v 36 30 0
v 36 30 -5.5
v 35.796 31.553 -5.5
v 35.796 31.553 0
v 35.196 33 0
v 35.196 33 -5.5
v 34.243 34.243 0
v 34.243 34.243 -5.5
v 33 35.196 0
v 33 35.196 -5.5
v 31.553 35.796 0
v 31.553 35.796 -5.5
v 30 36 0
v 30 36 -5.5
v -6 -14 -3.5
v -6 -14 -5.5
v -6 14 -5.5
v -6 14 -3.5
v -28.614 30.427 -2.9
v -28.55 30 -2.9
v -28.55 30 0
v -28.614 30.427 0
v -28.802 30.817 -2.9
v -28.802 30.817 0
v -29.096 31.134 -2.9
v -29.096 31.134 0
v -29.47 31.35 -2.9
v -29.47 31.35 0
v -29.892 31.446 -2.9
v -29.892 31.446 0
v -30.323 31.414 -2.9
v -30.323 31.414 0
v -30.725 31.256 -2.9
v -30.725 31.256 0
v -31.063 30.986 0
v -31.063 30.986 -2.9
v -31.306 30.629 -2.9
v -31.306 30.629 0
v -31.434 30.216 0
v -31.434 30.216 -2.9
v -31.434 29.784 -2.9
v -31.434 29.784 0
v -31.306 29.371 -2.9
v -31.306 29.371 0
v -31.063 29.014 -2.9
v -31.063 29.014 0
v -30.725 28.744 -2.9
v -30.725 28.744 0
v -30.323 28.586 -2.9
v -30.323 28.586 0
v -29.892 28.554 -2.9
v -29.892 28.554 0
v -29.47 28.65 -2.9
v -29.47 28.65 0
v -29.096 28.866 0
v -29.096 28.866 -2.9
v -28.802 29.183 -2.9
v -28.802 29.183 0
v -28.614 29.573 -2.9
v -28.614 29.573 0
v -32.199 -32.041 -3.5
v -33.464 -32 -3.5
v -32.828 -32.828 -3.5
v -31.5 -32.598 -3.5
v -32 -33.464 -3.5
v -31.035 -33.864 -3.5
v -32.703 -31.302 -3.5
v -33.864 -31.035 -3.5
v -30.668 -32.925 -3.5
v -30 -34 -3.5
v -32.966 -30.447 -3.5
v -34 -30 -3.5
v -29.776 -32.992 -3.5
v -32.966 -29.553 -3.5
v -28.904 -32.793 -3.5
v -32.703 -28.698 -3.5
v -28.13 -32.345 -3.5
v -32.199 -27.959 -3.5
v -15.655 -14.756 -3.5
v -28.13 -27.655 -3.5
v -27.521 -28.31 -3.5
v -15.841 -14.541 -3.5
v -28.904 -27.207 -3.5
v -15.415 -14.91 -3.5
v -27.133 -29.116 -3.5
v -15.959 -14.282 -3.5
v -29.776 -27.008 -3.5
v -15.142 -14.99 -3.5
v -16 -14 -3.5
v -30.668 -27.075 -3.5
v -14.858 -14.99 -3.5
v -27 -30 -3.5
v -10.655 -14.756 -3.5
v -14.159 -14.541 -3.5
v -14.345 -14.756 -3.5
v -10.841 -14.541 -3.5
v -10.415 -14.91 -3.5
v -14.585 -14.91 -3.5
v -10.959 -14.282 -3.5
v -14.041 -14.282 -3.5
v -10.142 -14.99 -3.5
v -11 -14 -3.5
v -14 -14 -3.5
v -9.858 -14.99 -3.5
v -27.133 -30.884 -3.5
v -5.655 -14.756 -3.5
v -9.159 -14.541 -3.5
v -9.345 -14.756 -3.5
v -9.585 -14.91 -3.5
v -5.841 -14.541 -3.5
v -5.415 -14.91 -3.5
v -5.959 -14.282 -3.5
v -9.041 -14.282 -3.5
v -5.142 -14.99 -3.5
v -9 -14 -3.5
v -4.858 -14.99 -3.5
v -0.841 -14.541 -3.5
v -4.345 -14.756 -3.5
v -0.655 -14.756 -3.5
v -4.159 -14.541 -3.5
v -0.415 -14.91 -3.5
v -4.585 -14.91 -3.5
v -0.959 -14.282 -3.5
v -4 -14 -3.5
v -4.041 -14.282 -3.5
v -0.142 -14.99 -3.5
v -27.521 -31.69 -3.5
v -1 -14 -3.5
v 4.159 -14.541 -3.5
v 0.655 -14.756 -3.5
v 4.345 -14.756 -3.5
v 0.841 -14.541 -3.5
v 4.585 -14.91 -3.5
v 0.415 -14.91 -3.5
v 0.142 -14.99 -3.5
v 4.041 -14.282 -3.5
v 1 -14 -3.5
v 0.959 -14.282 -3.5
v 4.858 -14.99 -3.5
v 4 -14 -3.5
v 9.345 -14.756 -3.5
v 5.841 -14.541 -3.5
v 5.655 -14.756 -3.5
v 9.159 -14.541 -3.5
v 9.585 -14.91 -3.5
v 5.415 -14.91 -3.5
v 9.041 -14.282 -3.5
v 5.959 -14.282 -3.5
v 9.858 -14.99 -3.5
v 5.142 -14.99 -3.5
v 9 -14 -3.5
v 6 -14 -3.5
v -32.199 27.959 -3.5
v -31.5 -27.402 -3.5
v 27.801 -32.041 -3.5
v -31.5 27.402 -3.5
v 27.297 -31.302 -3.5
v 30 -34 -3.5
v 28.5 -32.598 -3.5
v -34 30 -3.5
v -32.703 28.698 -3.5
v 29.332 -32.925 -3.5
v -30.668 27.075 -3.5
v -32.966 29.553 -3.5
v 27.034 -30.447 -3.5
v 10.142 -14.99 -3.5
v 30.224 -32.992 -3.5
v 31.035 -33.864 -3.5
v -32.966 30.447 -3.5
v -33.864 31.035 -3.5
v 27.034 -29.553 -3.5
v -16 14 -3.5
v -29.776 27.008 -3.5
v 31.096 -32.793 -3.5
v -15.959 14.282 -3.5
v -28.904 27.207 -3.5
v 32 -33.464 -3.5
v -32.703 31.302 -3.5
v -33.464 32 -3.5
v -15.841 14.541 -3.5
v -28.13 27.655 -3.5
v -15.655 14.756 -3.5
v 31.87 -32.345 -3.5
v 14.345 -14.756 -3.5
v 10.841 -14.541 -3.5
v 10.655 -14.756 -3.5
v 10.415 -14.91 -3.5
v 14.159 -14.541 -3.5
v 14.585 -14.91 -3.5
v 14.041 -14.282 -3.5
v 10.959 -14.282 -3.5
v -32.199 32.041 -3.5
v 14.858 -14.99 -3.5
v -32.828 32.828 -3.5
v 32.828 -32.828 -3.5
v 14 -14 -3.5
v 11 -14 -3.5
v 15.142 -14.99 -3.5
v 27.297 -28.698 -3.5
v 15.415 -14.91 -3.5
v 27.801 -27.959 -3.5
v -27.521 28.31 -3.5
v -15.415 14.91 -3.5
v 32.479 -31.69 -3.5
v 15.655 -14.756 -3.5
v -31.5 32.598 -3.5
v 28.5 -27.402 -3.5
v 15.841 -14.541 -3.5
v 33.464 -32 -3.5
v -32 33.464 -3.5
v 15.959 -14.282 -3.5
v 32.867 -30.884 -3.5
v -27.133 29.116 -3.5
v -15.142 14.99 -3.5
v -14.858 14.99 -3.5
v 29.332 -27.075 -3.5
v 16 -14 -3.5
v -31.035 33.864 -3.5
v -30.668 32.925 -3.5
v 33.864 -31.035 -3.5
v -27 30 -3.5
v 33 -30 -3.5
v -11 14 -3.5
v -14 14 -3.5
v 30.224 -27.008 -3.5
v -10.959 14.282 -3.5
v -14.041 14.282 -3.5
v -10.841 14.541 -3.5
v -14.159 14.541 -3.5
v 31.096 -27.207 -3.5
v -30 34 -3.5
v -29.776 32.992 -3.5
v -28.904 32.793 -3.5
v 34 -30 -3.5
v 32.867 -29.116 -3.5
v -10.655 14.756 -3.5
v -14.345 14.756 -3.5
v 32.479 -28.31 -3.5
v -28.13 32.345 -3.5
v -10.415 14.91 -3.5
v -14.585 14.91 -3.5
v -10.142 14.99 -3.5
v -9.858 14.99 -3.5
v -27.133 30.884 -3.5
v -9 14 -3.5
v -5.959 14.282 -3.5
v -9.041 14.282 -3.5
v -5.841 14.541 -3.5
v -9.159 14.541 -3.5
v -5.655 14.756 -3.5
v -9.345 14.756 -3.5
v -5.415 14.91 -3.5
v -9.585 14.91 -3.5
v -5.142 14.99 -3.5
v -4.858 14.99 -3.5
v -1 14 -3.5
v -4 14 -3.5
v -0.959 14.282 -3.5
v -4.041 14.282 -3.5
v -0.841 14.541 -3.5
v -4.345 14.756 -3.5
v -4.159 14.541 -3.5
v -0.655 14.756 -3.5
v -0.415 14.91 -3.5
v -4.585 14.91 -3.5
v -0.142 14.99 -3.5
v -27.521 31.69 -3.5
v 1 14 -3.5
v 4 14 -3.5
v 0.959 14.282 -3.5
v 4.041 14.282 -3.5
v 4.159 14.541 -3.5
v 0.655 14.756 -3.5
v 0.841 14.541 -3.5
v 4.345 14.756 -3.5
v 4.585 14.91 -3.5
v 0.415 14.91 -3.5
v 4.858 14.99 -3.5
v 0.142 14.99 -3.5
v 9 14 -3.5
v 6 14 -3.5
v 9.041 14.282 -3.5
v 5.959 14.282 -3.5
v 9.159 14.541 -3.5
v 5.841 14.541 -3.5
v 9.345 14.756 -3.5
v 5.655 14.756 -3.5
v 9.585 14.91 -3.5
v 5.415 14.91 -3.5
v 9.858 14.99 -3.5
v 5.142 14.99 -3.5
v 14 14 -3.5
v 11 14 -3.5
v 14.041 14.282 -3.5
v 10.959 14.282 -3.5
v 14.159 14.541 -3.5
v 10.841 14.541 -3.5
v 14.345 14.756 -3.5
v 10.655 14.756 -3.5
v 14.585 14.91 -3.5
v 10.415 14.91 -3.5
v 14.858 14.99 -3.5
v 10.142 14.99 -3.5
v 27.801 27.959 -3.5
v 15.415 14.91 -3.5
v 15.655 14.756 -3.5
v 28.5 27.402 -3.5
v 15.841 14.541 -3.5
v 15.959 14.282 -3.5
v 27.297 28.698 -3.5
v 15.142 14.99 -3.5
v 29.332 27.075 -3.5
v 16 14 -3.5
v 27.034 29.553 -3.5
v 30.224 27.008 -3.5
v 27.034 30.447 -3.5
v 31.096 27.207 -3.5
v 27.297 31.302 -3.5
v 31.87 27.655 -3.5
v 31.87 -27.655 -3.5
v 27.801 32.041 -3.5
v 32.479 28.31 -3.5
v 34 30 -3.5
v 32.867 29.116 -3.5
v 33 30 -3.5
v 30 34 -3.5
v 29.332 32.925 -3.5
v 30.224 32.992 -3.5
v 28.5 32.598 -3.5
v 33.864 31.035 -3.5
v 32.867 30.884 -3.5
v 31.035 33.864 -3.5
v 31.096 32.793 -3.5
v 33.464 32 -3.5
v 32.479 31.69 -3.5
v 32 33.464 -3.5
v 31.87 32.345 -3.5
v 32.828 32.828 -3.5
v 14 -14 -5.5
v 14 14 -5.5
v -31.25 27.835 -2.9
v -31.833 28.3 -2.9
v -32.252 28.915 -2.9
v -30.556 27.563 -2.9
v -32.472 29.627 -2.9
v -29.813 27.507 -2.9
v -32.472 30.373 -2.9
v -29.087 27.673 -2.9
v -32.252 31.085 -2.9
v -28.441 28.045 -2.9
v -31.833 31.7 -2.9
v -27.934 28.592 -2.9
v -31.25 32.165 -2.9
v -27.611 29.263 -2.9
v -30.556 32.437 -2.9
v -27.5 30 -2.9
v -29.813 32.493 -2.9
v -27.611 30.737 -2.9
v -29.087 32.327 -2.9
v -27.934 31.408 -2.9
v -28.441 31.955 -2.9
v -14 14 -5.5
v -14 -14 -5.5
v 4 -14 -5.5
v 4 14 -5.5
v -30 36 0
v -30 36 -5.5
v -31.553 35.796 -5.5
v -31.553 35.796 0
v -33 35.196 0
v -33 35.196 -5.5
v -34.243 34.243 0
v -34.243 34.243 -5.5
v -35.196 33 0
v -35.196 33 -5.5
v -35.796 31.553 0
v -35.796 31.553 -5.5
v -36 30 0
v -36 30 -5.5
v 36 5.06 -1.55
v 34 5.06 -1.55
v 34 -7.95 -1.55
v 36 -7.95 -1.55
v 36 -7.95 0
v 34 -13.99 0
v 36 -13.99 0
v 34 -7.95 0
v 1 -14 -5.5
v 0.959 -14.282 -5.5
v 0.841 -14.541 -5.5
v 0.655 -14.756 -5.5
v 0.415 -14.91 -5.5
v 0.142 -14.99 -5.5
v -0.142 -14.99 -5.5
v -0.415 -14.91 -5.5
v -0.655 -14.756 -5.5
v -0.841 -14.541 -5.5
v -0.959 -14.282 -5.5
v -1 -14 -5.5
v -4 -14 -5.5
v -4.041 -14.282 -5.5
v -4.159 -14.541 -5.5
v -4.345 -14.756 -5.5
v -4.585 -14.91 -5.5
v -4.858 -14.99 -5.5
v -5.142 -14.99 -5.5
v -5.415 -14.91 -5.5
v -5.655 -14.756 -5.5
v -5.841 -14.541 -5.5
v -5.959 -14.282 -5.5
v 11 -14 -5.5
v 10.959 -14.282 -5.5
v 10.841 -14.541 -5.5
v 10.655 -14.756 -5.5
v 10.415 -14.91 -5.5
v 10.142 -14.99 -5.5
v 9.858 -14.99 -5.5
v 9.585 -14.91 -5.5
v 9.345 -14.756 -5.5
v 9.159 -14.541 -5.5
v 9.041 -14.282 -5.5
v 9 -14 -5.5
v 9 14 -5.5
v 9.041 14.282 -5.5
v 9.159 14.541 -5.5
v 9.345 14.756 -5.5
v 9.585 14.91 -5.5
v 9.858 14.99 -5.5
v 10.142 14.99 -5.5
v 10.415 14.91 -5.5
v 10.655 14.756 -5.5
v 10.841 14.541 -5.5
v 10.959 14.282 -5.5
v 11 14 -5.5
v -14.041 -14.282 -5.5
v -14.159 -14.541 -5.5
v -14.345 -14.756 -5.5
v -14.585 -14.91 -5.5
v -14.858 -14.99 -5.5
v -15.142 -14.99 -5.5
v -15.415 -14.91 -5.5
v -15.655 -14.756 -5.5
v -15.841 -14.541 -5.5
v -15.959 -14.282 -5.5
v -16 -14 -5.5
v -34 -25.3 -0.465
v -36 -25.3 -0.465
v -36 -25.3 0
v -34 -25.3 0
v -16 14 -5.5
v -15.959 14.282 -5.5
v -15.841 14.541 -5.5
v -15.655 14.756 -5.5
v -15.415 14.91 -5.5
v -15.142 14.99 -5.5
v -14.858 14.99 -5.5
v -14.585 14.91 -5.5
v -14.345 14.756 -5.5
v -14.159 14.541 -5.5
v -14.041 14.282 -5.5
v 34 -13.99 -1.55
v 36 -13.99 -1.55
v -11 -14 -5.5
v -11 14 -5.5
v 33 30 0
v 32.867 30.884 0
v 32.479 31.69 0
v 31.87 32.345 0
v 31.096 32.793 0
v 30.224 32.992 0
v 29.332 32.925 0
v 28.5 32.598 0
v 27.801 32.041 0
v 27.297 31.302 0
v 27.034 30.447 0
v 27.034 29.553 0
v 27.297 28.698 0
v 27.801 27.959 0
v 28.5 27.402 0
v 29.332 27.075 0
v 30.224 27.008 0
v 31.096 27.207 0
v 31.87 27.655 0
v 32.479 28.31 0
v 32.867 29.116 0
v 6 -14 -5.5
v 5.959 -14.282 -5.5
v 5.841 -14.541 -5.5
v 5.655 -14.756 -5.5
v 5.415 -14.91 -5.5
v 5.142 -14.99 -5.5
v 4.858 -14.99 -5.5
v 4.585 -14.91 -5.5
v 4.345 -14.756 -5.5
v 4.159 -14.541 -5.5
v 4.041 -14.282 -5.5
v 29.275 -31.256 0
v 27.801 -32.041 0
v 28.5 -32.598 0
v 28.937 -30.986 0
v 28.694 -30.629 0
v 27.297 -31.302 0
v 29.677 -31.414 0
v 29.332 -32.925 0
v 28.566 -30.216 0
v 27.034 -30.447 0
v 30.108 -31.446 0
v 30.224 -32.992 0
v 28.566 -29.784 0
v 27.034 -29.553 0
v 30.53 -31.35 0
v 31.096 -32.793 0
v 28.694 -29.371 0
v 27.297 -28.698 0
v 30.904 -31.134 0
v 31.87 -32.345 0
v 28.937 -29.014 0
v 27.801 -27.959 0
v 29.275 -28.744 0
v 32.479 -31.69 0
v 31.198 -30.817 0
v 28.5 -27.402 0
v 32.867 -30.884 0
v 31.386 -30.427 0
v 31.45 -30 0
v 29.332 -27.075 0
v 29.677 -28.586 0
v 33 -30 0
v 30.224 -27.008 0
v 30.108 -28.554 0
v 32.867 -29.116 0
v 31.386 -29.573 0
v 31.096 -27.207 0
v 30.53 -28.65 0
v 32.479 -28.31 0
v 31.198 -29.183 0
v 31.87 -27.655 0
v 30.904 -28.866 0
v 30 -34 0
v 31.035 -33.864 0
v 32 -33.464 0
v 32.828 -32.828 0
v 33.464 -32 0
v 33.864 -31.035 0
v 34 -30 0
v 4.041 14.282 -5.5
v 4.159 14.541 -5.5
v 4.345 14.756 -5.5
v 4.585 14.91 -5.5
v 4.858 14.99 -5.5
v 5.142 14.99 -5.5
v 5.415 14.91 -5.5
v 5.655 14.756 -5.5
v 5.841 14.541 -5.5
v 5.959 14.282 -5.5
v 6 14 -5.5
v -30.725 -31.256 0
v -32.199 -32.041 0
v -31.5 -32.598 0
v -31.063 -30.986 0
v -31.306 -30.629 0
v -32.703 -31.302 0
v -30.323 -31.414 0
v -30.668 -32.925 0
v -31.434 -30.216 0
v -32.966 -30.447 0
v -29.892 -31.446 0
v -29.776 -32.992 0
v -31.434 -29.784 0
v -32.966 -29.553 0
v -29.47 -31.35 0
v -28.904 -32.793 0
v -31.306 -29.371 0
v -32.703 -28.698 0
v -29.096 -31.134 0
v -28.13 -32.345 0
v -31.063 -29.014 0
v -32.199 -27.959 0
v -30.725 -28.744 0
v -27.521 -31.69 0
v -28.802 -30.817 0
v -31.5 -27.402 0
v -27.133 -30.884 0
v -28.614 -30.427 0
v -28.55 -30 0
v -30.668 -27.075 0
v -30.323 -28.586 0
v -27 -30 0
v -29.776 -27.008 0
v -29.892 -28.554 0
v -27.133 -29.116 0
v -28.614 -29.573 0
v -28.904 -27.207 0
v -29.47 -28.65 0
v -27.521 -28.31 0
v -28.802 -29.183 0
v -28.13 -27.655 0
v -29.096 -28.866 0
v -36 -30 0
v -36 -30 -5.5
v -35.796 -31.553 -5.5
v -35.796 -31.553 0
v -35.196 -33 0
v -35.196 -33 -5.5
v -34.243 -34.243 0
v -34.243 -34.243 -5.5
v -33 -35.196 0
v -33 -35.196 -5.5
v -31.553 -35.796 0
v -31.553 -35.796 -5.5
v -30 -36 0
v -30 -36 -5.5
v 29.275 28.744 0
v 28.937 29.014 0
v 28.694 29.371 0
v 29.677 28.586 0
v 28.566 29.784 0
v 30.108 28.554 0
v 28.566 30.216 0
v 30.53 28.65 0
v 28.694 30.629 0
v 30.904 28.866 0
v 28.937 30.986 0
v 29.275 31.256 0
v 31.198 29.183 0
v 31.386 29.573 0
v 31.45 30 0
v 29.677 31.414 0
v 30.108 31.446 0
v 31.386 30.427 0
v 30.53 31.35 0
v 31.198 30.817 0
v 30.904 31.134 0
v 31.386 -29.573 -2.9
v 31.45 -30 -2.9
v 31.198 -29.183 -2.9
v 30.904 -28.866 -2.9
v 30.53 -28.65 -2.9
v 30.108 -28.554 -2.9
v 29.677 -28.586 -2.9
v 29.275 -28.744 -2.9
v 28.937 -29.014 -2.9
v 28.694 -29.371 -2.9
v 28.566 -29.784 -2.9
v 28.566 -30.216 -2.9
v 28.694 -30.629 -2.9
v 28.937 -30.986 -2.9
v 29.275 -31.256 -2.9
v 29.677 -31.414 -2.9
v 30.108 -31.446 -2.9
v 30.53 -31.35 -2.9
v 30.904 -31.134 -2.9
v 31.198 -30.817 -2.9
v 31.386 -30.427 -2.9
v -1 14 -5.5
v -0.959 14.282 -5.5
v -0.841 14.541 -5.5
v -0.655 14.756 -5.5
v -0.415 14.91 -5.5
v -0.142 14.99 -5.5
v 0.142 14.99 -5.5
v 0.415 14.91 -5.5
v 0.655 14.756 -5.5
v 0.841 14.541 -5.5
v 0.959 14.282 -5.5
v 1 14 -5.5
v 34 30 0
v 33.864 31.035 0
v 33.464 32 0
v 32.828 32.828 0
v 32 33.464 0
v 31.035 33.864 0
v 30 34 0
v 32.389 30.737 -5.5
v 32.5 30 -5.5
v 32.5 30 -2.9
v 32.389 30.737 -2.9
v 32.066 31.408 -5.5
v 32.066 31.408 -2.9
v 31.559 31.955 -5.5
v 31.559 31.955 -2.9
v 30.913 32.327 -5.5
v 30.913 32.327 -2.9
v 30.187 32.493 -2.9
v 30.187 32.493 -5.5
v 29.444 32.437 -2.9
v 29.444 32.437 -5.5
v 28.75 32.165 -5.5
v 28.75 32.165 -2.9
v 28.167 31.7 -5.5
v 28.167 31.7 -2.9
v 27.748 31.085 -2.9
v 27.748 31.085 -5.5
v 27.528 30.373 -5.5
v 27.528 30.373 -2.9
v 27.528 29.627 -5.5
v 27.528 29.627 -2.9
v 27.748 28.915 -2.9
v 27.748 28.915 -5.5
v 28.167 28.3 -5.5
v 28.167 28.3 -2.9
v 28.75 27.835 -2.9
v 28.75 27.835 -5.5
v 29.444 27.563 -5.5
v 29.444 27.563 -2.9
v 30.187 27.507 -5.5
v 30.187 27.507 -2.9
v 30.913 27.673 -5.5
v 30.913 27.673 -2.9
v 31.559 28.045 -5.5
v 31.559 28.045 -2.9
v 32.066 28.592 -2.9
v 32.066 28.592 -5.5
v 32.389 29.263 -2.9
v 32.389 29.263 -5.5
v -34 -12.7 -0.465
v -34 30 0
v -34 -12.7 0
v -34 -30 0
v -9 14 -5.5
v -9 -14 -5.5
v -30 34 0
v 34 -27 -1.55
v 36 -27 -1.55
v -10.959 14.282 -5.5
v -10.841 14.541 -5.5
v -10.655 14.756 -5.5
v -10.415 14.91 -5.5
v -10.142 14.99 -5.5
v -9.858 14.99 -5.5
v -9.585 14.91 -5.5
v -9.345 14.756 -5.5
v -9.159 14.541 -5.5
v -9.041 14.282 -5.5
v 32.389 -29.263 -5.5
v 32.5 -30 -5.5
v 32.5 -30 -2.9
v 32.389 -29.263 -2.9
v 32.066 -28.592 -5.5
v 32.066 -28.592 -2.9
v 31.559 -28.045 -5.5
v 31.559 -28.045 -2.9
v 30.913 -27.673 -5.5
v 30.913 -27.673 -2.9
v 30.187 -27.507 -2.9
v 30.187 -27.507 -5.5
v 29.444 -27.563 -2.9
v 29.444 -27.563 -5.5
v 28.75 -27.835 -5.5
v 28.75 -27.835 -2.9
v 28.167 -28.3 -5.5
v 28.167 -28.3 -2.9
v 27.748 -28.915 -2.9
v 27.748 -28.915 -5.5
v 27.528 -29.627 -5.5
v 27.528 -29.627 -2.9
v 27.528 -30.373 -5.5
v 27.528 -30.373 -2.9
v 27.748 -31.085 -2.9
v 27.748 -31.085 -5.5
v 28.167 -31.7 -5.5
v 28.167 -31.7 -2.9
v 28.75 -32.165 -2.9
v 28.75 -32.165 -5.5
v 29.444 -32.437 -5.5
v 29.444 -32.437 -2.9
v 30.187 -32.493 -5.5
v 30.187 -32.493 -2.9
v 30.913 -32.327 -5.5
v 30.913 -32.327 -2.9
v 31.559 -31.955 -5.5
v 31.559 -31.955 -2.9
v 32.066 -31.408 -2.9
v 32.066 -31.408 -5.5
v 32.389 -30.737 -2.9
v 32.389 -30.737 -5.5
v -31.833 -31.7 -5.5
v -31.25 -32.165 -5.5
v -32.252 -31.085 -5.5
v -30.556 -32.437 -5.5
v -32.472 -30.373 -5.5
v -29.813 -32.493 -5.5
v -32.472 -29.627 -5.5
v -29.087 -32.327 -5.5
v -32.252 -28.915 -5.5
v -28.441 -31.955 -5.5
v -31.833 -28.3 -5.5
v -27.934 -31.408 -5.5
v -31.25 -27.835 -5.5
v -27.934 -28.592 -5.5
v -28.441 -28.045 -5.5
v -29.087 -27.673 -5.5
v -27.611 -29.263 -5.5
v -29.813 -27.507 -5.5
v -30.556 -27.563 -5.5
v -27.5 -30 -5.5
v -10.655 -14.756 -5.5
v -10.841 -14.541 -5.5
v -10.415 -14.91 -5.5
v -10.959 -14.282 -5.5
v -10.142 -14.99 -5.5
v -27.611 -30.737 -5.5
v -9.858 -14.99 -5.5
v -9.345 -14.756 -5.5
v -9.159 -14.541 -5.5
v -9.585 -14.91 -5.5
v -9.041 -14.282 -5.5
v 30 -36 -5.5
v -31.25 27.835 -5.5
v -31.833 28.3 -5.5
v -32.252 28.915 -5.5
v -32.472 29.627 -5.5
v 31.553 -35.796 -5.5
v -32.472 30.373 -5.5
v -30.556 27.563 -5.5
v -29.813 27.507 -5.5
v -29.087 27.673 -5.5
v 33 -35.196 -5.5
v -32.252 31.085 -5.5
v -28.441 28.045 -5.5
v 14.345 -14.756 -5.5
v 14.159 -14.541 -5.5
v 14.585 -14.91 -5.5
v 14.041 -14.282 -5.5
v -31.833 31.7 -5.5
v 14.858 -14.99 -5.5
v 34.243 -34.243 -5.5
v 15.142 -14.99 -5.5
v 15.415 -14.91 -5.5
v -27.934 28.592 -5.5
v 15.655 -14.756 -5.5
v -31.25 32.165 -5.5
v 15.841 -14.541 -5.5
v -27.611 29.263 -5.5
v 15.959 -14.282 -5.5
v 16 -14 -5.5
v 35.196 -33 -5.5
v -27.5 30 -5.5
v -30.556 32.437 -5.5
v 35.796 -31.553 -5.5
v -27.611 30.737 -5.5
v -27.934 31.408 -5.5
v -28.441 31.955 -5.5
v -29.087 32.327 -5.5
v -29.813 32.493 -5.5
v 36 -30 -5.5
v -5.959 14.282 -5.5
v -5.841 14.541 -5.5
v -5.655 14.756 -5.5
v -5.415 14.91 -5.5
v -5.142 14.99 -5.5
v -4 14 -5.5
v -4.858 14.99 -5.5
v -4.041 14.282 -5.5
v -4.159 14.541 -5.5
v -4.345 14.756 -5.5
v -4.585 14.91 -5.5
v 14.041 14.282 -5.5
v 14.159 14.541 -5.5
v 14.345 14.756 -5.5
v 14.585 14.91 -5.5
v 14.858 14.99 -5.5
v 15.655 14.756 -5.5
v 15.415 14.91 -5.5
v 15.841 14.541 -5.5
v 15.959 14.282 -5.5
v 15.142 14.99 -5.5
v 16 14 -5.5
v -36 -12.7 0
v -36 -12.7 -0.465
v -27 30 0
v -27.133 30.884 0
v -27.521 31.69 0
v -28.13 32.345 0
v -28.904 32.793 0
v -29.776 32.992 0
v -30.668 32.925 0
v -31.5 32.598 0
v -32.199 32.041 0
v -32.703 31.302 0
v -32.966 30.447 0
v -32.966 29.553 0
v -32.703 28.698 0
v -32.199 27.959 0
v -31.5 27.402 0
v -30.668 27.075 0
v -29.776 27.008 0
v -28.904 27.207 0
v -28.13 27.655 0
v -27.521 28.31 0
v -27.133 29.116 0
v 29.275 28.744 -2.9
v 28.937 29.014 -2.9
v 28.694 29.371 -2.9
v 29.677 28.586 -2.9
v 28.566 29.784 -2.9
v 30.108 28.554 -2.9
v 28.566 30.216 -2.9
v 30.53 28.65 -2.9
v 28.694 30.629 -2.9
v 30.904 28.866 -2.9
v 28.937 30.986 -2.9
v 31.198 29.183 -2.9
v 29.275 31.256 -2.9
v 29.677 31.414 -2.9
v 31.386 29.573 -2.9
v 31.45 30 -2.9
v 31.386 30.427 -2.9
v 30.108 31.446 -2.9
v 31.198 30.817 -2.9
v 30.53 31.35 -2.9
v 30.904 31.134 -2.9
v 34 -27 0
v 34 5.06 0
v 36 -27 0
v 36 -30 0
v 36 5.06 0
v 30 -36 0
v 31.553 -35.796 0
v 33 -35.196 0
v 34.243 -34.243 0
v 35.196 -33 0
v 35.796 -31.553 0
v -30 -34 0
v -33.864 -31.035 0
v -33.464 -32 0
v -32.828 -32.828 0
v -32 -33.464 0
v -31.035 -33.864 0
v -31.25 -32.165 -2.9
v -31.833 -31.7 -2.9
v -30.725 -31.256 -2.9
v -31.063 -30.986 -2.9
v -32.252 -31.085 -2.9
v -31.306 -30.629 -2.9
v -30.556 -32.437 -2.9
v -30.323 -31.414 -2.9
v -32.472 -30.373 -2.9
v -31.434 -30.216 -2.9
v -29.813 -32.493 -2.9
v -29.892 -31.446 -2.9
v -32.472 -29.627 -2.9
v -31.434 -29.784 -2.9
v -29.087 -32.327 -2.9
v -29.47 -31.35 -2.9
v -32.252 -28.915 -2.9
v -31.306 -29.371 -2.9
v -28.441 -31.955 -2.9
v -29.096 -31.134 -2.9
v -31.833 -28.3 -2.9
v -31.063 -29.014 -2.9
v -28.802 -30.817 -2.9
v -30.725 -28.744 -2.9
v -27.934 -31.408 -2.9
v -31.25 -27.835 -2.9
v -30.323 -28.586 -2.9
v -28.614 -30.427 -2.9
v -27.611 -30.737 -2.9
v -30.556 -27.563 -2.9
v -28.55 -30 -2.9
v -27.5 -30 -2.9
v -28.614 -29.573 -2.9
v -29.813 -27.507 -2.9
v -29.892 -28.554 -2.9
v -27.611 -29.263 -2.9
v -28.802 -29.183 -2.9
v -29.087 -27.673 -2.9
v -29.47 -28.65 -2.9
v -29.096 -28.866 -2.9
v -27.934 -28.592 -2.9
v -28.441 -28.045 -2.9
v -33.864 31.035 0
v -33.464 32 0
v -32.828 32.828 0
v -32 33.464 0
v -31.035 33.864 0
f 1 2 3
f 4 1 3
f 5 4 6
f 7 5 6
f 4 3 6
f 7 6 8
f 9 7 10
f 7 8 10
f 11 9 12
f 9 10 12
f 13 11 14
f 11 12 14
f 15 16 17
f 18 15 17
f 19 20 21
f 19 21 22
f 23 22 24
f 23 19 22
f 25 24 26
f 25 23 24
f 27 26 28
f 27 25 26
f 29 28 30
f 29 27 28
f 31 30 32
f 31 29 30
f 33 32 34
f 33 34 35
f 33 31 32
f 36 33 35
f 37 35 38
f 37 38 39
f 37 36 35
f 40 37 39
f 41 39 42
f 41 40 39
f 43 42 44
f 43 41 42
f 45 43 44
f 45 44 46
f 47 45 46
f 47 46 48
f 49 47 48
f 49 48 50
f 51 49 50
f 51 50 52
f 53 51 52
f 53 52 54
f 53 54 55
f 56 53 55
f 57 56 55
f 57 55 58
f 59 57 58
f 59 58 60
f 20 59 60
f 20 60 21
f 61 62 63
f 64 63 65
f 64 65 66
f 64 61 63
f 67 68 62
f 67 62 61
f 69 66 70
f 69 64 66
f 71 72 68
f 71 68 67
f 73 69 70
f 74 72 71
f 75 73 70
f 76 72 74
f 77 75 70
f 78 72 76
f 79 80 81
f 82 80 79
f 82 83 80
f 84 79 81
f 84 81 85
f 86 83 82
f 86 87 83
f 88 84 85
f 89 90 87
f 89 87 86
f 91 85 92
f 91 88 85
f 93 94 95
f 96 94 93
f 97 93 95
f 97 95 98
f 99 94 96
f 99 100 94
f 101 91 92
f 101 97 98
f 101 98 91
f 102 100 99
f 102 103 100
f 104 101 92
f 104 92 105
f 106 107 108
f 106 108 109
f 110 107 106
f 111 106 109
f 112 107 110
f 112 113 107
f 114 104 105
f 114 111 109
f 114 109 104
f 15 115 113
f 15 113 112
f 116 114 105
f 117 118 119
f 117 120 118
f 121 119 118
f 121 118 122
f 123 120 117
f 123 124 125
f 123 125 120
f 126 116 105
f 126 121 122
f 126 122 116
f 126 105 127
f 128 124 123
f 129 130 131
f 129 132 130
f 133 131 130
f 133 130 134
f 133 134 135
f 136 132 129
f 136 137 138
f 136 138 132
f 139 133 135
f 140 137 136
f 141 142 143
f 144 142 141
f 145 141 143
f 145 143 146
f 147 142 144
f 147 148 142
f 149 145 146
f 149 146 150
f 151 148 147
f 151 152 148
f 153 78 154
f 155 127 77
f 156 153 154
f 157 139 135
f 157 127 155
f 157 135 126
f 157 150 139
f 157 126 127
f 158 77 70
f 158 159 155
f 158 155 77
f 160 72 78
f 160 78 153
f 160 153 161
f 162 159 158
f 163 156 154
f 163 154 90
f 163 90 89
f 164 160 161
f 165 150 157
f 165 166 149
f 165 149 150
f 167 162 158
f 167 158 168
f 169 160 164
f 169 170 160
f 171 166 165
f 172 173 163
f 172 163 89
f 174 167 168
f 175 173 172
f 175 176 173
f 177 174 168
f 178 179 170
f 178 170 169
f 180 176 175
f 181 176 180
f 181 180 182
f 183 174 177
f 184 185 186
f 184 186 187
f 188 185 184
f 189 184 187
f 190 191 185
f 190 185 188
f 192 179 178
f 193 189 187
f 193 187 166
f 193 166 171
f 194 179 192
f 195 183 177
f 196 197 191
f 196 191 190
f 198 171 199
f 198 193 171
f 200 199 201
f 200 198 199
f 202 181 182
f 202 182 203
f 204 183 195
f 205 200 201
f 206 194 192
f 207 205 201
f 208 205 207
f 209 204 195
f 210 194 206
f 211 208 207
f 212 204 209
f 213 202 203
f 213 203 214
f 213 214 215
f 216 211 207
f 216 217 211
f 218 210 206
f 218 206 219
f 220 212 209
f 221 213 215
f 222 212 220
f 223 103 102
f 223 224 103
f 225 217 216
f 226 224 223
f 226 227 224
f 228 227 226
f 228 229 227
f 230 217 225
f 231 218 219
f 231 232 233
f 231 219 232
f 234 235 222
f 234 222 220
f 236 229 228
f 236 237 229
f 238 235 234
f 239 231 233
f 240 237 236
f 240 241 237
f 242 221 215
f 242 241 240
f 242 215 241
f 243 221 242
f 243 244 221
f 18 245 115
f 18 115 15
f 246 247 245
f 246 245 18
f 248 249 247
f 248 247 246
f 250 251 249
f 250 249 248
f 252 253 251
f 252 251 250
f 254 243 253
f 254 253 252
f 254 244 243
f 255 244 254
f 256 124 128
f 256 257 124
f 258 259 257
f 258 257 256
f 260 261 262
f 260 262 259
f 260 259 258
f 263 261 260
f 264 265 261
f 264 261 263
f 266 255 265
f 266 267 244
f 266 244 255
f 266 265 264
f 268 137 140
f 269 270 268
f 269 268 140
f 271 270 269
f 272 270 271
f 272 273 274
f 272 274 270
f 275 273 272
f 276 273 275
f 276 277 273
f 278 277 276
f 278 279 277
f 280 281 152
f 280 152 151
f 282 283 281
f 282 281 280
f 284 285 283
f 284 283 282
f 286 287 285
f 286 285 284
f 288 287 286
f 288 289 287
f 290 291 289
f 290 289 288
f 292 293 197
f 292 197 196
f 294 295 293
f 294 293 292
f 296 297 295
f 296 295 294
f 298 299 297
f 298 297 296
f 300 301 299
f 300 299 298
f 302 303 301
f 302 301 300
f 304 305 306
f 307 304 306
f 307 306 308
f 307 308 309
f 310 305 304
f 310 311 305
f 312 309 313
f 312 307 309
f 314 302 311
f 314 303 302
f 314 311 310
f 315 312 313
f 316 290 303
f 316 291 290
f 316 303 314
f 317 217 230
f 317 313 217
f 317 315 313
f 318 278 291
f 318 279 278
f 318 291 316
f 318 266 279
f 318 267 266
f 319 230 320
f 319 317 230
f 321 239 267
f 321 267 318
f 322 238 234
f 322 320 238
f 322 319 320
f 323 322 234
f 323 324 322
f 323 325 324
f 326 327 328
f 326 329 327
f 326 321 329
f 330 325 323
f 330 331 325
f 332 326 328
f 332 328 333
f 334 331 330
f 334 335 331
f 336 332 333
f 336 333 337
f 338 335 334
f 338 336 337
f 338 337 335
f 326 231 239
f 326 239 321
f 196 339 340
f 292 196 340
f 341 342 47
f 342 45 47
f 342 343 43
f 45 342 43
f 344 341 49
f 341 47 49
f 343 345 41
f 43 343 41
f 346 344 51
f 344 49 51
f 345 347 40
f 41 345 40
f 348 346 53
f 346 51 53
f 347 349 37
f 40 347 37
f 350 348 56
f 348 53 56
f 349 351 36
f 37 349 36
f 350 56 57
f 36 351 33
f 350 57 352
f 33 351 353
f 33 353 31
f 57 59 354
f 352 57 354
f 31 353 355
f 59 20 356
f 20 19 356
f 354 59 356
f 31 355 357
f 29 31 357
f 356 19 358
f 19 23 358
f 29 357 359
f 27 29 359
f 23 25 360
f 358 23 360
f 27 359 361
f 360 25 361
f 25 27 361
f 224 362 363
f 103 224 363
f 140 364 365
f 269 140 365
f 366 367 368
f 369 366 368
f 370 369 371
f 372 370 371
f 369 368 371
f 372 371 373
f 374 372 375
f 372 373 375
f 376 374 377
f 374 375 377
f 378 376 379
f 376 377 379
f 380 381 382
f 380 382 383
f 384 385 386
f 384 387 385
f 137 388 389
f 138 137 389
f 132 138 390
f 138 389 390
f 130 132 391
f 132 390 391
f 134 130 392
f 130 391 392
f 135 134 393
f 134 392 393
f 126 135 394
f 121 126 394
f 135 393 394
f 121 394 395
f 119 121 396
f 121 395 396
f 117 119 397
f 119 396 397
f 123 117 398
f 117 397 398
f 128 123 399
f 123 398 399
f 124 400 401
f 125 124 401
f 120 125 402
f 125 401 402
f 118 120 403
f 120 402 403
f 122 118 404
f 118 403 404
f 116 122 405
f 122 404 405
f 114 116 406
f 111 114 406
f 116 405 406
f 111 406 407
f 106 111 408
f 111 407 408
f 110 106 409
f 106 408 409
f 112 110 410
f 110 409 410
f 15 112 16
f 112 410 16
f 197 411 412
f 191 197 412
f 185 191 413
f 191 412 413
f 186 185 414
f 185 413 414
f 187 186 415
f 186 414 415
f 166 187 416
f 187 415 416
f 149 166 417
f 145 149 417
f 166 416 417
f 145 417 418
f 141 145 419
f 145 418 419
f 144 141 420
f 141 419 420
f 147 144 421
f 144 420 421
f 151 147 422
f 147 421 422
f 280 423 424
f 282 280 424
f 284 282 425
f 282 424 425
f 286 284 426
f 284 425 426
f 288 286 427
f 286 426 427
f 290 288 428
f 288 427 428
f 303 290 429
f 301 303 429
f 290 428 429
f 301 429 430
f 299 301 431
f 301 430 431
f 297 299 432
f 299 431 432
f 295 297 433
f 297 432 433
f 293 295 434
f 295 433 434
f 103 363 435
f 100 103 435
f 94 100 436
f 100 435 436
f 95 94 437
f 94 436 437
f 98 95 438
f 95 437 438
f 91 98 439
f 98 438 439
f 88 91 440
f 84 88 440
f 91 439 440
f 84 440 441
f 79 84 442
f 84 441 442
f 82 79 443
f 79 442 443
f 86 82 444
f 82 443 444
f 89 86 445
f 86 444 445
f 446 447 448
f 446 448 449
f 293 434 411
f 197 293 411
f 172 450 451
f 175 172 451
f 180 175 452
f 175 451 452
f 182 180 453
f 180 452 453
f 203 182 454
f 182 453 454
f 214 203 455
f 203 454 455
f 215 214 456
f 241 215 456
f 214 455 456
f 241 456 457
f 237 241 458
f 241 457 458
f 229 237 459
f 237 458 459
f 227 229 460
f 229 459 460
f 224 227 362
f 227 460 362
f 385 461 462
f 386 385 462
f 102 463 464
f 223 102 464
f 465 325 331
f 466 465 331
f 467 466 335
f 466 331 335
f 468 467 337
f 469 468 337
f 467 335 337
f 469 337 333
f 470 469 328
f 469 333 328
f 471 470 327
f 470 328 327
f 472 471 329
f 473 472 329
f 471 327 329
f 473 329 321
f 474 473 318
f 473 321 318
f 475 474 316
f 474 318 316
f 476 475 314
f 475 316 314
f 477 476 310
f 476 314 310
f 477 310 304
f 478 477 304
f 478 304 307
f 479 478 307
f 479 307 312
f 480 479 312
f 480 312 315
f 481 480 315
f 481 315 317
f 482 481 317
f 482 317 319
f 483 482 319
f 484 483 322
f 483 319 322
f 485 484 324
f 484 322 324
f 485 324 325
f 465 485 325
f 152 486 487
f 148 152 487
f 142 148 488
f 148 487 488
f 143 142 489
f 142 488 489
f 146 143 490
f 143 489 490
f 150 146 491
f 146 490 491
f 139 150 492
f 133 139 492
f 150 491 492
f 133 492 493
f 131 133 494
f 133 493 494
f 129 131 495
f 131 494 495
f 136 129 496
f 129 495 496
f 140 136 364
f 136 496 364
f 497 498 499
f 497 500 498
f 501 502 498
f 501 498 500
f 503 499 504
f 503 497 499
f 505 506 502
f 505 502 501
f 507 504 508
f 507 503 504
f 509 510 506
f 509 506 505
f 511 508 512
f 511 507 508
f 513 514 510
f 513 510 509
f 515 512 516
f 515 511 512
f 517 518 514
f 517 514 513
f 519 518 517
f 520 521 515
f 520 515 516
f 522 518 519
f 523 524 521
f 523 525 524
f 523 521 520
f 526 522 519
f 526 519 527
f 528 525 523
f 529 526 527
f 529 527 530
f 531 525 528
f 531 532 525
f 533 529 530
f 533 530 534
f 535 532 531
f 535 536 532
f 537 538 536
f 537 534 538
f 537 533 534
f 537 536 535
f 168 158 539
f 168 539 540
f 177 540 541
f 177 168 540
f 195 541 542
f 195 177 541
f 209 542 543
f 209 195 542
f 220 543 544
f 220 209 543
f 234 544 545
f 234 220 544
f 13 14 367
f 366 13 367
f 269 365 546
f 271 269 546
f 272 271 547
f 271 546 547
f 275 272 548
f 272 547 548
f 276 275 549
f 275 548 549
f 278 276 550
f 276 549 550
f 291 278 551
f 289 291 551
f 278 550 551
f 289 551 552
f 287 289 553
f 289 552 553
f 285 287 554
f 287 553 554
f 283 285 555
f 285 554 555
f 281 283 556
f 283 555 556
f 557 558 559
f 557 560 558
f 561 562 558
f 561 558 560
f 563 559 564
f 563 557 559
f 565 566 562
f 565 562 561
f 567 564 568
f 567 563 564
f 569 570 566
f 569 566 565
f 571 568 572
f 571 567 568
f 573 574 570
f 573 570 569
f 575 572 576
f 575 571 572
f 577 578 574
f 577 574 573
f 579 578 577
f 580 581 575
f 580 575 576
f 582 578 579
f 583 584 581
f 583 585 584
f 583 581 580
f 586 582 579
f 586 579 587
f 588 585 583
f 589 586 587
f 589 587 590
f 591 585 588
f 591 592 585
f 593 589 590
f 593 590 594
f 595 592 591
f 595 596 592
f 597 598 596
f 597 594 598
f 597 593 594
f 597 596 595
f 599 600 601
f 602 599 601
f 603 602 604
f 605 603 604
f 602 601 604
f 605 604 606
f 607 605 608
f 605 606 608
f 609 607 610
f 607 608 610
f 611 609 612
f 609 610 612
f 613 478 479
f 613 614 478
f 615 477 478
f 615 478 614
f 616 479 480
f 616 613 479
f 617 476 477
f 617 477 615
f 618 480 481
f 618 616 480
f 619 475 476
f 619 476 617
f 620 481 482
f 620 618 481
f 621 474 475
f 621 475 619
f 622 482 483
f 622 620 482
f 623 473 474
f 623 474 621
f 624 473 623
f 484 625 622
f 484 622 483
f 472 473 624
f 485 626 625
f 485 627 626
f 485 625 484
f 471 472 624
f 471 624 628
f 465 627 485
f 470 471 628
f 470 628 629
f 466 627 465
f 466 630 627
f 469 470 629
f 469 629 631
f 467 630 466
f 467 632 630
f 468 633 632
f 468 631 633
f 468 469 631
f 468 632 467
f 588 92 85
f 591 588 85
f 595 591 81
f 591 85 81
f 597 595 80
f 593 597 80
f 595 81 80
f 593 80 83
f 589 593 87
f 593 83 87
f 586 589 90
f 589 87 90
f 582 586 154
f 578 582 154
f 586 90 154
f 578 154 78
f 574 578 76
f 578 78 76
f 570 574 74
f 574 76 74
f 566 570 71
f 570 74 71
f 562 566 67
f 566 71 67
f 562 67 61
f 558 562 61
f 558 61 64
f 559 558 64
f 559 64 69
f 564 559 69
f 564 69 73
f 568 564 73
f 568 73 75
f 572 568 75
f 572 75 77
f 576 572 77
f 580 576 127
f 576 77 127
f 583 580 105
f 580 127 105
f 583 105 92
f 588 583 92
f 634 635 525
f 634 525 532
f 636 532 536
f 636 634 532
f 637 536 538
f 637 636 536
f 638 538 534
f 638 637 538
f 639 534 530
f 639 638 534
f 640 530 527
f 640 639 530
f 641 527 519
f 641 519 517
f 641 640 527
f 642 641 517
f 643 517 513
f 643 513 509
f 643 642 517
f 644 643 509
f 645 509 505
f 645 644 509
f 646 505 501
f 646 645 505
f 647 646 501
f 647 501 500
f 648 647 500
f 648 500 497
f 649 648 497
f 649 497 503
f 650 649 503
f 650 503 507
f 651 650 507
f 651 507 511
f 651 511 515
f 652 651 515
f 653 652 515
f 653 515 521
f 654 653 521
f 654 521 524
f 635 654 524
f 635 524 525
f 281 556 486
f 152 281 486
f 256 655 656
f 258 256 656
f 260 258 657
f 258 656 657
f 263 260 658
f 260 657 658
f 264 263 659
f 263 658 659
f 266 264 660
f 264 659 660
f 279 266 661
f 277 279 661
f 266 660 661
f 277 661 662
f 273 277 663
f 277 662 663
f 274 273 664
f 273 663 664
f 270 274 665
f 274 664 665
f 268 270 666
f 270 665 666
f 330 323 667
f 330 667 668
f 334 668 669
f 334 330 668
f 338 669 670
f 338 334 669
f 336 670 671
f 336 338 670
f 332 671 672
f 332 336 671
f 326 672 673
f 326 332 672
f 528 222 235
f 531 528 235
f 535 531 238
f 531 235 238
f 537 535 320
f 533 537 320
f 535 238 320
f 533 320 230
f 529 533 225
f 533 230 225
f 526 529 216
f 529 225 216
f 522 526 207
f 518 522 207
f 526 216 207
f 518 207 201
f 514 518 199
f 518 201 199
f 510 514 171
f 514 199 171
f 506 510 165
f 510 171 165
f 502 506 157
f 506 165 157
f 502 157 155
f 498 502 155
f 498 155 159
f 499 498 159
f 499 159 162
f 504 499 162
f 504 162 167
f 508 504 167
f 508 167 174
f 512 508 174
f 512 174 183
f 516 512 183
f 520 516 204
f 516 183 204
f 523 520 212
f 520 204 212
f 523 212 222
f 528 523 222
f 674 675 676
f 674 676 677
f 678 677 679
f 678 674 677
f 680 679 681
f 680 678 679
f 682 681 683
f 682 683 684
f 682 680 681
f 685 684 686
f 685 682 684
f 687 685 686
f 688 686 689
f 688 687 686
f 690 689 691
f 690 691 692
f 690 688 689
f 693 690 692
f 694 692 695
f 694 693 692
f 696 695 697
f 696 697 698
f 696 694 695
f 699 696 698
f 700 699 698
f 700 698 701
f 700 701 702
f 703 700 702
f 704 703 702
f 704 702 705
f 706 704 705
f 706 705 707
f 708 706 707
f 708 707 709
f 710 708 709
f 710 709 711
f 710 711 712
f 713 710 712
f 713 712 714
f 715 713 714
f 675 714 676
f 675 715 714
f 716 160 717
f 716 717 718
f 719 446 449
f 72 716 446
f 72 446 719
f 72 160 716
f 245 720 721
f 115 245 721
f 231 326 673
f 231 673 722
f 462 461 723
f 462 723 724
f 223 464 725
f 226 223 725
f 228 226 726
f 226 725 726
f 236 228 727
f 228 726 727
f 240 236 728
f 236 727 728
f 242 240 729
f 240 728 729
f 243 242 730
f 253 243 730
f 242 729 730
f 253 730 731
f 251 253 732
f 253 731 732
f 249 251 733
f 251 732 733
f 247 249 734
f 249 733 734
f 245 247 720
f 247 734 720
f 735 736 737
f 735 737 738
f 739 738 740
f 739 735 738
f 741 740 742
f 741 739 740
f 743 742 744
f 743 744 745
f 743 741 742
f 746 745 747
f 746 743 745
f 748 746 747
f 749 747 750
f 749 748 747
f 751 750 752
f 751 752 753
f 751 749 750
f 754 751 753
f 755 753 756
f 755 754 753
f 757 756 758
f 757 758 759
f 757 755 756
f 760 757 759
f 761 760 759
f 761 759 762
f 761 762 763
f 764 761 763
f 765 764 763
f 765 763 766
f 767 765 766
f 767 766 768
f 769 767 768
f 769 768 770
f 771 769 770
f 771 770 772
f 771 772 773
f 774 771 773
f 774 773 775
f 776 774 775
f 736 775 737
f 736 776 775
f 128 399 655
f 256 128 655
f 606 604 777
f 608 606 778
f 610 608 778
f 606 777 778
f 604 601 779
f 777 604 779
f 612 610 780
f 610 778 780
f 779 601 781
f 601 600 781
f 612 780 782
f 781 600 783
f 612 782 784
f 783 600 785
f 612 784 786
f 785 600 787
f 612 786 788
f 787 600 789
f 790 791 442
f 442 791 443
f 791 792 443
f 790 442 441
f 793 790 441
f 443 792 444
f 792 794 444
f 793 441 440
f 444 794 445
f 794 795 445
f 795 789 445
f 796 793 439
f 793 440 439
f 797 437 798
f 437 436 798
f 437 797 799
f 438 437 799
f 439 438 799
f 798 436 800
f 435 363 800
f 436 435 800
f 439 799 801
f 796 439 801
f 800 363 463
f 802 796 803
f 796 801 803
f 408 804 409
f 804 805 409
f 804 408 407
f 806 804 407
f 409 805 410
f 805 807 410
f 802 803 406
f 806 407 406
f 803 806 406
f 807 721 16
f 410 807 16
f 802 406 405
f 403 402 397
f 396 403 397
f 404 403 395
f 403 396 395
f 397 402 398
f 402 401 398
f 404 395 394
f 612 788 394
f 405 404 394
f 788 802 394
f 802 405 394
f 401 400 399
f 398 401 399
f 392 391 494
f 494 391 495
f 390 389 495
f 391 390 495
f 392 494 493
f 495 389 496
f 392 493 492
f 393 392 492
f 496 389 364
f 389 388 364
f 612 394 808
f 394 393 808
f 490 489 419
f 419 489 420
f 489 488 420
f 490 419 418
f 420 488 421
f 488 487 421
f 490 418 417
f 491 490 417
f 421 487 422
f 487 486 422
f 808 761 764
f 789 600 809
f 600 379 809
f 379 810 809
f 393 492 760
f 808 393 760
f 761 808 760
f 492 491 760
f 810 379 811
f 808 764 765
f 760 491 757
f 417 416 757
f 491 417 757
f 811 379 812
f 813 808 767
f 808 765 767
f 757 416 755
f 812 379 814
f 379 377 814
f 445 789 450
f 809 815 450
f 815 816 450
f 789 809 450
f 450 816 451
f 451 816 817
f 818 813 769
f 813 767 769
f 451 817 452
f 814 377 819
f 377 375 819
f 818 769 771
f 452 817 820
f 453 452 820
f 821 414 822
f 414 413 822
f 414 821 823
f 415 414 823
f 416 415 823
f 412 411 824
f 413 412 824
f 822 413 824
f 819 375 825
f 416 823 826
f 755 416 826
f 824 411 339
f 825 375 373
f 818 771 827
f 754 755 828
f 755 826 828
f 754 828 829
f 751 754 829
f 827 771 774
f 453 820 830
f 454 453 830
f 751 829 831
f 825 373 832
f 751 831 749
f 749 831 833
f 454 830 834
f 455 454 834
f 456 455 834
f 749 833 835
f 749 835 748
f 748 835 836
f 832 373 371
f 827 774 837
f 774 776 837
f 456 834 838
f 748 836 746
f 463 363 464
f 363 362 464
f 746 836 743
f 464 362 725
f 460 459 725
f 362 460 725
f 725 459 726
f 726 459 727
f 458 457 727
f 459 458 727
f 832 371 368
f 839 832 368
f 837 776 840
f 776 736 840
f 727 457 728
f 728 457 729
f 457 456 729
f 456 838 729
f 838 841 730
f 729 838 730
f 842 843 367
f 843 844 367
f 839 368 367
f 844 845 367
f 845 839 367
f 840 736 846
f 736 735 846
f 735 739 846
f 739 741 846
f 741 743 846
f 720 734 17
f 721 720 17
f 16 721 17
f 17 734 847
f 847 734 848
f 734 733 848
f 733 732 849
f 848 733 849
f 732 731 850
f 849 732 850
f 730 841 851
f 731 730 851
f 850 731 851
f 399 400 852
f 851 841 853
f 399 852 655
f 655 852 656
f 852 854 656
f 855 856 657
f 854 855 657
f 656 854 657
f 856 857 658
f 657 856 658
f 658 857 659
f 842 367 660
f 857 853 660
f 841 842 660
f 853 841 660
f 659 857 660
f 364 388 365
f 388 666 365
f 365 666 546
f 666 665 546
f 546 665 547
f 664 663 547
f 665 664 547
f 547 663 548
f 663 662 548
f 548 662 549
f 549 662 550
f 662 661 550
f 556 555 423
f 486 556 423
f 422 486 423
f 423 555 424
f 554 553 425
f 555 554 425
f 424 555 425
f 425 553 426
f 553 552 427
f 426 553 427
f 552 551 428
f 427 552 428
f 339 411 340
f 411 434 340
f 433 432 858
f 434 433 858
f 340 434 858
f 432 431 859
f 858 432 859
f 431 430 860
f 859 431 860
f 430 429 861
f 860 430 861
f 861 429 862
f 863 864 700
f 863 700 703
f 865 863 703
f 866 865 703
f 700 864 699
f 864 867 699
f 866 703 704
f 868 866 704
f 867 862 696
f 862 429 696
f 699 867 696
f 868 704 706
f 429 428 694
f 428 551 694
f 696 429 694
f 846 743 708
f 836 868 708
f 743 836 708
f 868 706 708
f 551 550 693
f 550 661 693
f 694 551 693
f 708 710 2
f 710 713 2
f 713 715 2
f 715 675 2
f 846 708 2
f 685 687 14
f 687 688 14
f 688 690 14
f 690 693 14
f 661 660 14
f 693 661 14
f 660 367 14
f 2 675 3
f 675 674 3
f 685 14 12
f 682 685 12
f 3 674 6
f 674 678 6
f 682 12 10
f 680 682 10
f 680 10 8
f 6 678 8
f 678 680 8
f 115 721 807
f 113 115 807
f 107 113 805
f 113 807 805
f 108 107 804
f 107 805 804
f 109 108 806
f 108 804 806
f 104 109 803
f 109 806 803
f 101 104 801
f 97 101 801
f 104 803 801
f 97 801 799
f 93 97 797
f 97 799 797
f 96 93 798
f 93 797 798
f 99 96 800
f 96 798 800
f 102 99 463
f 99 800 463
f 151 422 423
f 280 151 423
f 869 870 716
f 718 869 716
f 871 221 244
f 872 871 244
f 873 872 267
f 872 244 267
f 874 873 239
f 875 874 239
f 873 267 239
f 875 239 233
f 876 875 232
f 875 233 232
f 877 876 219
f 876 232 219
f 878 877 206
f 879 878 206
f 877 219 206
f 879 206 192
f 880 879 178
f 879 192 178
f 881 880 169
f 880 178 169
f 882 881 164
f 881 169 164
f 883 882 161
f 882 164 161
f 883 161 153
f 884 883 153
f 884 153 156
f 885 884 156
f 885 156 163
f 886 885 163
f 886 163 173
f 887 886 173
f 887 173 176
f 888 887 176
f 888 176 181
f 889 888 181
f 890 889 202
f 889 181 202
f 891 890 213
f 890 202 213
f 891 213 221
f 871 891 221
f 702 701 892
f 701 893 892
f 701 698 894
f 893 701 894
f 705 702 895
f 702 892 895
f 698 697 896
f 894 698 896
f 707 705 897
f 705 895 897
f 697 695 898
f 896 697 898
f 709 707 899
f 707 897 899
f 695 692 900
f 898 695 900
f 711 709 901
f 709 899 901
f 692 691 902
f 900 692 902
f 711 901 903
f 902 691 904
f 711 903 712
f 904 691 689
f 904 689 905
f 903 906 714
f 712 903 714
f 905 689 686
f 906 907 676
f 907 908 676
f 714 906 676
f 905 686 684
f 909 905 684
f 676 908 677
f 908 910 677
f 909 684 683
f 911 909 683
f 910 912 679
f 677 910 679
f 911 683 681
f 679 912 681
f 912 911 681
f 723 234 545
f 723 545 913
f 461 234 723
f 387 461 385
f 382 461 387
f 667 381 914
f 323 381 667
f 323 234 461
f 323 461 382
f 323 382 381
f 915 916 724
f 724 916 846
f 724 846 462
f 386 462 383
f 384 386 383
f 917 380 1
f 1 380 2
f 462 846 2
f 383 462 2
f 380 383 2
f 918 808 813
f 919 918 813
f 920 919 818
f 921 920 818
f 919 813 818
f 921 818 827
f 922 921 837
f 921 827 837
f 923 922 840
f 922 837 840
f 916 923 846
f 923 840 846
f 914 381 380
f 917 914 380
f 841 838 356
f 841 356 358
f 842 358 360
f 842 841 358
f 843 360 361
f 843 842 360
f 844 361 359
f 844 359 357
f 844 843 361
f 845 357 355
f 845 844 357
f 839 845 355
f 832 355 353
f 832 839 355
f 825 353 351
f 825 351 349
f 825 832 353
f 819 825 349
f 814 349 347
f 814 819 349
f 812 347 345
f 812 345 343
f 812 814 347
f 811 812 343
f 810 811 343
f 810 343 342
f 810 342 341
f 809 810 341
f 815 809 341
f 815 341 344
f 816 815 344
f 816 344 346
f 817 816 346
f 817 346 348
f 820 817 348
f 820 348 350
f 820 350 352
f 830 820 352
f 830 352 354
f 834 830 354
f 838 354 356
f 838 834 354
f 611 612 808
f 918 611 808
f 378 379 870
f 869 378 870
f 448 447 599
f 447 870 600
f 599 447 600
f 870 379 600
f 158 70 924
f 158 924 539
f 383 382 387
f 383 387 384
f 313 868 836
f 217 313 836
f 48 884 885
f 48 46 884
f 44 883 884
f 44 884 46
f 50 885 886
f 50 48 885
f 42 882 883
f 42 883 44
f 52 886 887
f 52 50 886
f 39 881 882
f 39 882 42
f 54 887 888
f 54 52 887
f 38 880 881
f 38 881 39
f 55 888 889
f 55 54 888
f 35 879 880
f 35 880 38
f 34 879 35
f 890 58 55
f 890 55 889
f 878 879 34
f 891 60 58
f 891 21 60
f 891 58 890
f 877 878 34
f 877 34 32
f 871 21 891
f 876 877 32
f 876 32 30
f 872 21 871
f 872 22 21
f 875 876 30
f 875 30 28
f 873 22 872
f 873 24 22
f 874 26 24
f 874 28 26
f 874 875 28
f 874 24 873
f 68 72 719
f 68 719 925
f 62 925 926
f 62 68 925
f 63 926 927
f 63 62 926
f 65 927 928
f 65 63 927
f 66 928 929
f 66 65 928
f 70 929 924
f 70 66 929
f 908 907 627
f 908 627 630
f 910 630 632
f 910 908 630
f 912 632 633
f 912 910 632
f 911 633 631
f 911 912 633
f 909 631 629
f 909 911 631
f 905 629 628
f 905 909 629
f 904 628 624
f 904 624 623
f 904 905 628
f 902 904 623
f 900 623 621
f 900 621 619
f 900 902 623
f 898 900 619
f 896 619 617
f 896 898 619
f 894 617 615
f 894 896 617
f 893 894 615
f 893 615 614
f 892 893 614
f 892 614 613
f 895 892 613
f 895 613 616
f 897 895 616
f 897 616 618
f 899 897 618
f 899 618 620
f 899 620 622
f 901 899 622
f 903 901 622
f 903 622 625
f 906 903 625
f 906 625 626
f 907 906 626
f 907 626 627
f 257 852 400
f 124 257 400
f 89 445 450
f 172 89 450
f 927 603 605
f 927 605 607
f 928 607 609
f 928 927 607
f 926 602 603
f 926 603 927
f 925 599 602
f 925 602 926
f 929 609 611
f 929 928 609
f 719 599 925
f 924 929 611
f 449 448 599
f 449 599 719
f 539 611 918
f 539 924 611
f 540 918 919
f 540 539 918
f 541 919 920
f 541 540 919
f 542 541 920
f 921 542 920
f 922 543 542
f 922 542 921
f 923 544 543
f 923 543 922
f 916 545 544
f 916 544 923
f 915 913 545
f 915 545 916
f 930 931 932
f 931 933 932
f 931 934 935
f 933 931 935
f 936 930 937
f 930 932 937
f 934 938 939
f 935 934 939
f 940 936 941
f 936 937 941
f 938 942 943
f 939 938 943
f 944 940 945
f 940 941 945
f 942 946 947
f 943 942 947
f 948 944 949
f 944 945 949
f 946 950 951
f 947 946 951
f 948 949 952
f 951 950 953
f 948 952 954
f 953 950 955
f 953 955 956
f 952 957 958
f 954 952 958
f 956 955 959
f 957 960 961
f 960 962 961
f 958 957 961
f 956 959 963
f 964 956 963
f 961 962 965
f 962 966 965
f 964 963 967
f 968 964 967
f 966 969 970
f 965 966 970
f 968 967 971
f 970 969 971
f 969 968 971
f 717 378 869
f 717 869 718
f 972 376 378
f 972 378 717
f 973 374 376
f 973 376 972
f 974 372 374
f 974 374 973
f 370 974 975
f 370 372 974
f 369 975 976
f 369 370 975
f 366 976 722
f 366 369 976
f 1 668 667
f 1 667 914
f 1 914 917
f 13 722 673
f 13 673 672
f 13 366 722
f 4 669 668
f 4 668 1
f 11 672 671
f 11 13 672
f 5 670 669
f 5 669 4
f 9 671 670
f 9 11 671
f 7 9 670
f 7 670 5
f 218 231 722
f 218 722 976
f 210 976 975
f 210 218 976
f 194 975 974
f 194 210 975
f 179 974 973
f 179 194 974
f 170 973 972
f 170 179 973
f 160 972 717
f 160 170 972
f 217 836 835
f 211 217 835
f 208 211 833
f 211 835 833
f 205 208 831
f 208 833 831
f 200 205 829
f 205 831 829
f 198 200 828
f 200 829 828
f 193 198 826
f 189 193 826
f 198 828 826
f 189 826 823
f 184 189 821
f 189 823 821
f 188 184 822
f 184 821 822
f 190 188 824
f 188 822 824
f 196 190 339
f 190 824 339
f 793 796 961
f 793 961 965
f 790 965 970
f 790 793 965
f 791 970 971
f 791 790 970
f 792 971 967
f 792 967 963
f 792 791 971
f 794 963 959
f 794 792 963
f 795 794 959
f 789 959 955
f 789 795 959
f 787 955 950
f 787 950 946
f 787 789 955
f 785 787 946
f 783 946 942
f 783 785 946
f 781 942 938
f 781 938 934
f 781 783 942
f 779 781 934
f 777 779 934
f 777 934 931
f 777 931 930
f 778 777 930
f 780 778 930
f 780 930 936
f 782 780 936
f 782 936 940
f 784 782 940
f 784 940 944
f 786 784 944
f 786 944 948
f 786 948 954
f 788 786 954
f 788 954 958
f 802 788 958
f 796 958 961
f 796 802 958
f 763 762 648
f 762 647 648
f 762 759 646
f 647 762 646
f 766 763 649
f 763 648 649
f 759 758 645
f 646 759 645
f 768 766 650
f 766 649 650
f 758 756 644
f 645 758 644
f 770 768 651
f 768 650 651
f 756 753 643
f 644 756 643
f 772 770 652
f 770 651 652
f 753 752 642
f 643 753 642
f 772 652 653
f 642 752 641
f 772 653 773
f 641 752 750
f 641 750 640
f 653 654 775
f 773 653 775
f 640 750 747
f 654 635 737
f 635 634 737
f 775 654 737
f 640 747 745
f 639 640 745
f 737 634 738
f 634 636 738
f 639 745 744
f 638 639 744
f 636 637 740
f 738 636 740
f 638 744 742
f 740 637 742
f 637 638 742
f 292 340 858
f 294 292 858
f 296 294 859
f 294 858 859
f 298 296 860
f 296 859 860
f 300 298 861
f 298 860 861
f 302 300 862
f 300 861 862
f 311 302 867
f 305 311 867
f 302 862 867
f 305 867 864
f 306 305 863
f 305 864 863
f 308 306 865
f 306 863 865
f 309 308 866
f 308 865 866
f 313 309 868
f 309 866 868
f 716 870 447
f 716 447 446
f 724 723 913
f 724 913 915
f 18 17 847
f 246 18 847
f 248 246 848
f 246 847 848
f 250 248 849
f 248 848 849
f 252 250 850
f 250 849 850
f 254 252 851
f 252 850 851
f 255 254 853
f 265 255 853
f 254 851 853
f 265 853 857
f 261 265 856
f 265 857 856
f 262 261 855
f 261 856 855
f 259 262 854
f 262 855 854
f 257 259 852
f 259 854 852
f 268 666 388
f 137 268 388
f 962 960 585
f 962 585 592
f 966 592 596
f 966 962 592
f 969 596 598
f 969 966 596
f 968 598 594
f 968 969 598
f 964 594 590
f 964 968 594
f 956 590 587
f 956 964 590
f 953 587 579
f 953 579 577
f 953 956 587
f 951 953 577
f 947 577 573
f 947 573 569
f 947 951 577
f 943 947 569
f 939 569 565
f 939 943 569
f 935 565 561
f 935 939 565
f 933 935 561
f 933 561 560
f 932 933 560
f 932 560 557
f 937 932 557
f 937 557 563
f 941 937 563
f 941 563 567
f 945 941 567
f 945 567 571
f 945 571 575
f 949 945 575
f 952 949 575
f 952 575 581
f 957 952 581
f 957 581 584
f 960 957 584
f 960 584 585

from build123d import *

# Parameters (mm, degrees)
BOSS_EXTRUDE1_DEPTH = 5.5
CUT_EXTRUDE1_DEPTH  = 3.5
SKETCH3_R           = 3
BOSS_EXTRUDE2_DEPTH = 3.5
SKETCH4_R           = 1.45
CUT_EXTRUDE2_DEPTH  = 5.5
SKETCH5_R           = 2.5
CUT_EXTRUDE3_DEPTH  = 2.6
CUT_EXTRUDE4_DEPTH  = 2
SKETCH7_W           = 3.5
SKETCH7_H           = 13.01
CUT_EXTRUDE5_DEPTH  = 1.55
SKETCH8_W           = 3.5
SKETCH8_H           = 12.6
CUT_EXTRUDE6_DEPTH  = 0.465


with BuildPart() as part:
    # Sketch1 → Boss-Extrude1 (new body)
    with BuildSketch(Plane.XY.offset(-5.5)):
        with BuildLine():
            Line((-30, -36), (30, -36))
            ThreePointArc((30, -36), (34.242640687, -34.242640687), (36, -30))
            Line((36, -30), (36, 30))
            ThreePointArc((36, 30), (34.242640687, 34.242640687), (30, 36))
            Line((30, 36), (-30, 36))
            ThreePointArc((-30, 36), (-34.242640687, 34.242640687), (-36, 30))
            Line((-36, 30), (-36, -30))
            ThreePointArc((-36, -30), (-34.242640687, -34.242640687), (-30, -36))
        make_face()
    extrude(amount=BOSS_EXTRUDE1_DEPTH)

    # Sketch2 → Cut-Extrude1 (cut)
    with BuildSketch(Plane.XY.offset(-3.5)):
        with BuildLine():
            Line((-30, -34), (30, -34))
            ThreePointArc((30, -34), (32.828427125, -32.828427125), (34, -30))
            Line((34, -30), (34, 30))
            ThreePointArc((34, 30), (32.828427125, 32.828427125), (30, 34))
            Line((30, 34), (-30, 34))
            ThreePointArc((-30, 34), (-32.828427125, 32.828427125), (-34, 30))
            Line((-34, 30), (-34, -30))
            ThreePointArc((-34, -30), (-32.828427125, -32.828427125), (-30, -34))
        make_face()
    extrude(amount=CUT_EXTRUDE1_DEPTH, mode=Mode.SUBTRACT)

    # Sketch3 → Boss-Extrude2 (add)
    with BuildSketch(Plane.XY.offset(-3.5)):
        with Locations((-30, 30)):
            Circle(SKETCH3_R)
        with Locations((30, 30)):
            Circle(SKETCH3_R)
        with Locations((-30, -30)):
            Circle(SKETCH3_R)
        with Locations((30, -30)):
            Circle(SKETCH3_R)
    extrude(amount=BOSS_EXTRUDE2_DEPTH)

    # Sketch4 → Cut-Extrude2 (cut)
    with BuildSketch(Plane.XY.offset(-5.5)):
        with Locations((-30, 30)):
            Circle(SKETCH4_R)
        with Locations((30, 30)):
            Circle(SKETCH4_R)
        with Locations((-30, -30)):
            Circle(SKETCH4_R)
        with Locations((30, -30)):
            Circle(SKETCH4_R)
    extrude(amount=CUT_EXTRUDE2_DEPTH, mode=Mode.SUBTRACT)

    # Sketch5 → Cut-Extrude3 (cut)
    with BuildSketch(Plane.XY.offset(-5.5)):
        with Locations((-30, 30)):
            Circle(SKETCH5_R)
        with Locations((30, 30)):
            Circle(SKETCH5_R)
        with Locations((-30, -30)):
            Circle(SKETCH5_R)
        with Locations((30, -30)):
            Circle(SKETCH5_R)
    extrude(amount=CUT_EXTRUDE3_DEPTH, mode=Mode.SUBTRACT)

    # Sketch6 → Cut-Extrude4 (cut)
    with BuildSketch(Plane.XY.offset(-5.5)):
        with BuildLine():
            Line((-16, -14), (-16, 14))
            ThreePointArc((-16, 14), (-15, 15), (-14, 14))
            Line((-14, 14), (-14, -14))
            ThreePointArc((-14, -14), (-15, -15), (-16, -14))
        make_face()
        with BuildLine():
            Line((-11, -14), (-11, 14))
            ThreePointArc((-11, 14), (-10, 15), (-9, 14))
            Line((-9, 14), (-9, -14))
            ThreePointArc((-9, -14), (-10, -15), (-11, -14))
        make_face()
        with BuildLine():
            Line((-6, -14), (-6, 14))
            ThreePointArc((-6, 14), (-5, 15), (-4, 14))
            Line((-4, 14), (-4, -14))
            ThreePointArc((-4, -14), (-5, -15), (-6, -14))
        make_face()
        with BuildLine():
            Line((-1, -14), (-1, 14))
            ThreePointArc((-1, 14), (0, 15), (1, 14))
            Line((1, 14), (1, -14))
            ThreePointArc((1, -14), (0, -15), (-1, -14))
        make_face()
        with BuildLine():
            Line((4, -14), (4, 14))
            ThreePointArc((4, 14), (5, 15), (6, 14))
            Line((6, 14), (6, -14))
            ThreePointArc((6, -14), (5, -15), (4, -14))
        make_face()
        with BuildLine():
            Line((9, -14), (9, 14))
            ThreePointArc((9, 14), (10, 15), (11, 14))
            Line((11, 14), (11, -14))
            ThreePointArc((11, -14), (10, -15), (9, -14))
        make_face()
        with BuildLine():
            Line((14, -14), (14, 14))
            ThreePointArc((14, 14), (15, 15), (16, 14))
            Line((16, 14), (16, -14))
            ThreePointArc((16, -14), (15, -15), (14, -14))
        make_face()
    extrude(amount=CUT_EXTRUDE4_DEPTH, mode=Mode.SUBTRACT)

    # Sketch7 → Cut-Extrude5 (cut)
    with BuildSketch(Plane.XY.offset(-1.55)):
        with Locations((35.25, -1.445)):
            Rectangle(SKETCH7_W, SKETCH7_H)
        with Locations((35.25, -20.495)):
            Rectangle(SKETCH7_W, SKETCH7_H)
    extrude(amount=CUT_EXTRUDE5_DEPTH, mode=Mode.SUBTRACT)

    # Sketch8 → Cut-Extrude6 (cut)
    with BuildSketch(Plane.XY.offset(-0.465)):
        with Locations((-35.25, -19)):
            Rectangle(SKETCH8_W, SKETCH8_H)
    extrude(amount=CUT_EXTRUDE6_DEPTH, mode=Mode.SUBTRACT)


solid = part.part
